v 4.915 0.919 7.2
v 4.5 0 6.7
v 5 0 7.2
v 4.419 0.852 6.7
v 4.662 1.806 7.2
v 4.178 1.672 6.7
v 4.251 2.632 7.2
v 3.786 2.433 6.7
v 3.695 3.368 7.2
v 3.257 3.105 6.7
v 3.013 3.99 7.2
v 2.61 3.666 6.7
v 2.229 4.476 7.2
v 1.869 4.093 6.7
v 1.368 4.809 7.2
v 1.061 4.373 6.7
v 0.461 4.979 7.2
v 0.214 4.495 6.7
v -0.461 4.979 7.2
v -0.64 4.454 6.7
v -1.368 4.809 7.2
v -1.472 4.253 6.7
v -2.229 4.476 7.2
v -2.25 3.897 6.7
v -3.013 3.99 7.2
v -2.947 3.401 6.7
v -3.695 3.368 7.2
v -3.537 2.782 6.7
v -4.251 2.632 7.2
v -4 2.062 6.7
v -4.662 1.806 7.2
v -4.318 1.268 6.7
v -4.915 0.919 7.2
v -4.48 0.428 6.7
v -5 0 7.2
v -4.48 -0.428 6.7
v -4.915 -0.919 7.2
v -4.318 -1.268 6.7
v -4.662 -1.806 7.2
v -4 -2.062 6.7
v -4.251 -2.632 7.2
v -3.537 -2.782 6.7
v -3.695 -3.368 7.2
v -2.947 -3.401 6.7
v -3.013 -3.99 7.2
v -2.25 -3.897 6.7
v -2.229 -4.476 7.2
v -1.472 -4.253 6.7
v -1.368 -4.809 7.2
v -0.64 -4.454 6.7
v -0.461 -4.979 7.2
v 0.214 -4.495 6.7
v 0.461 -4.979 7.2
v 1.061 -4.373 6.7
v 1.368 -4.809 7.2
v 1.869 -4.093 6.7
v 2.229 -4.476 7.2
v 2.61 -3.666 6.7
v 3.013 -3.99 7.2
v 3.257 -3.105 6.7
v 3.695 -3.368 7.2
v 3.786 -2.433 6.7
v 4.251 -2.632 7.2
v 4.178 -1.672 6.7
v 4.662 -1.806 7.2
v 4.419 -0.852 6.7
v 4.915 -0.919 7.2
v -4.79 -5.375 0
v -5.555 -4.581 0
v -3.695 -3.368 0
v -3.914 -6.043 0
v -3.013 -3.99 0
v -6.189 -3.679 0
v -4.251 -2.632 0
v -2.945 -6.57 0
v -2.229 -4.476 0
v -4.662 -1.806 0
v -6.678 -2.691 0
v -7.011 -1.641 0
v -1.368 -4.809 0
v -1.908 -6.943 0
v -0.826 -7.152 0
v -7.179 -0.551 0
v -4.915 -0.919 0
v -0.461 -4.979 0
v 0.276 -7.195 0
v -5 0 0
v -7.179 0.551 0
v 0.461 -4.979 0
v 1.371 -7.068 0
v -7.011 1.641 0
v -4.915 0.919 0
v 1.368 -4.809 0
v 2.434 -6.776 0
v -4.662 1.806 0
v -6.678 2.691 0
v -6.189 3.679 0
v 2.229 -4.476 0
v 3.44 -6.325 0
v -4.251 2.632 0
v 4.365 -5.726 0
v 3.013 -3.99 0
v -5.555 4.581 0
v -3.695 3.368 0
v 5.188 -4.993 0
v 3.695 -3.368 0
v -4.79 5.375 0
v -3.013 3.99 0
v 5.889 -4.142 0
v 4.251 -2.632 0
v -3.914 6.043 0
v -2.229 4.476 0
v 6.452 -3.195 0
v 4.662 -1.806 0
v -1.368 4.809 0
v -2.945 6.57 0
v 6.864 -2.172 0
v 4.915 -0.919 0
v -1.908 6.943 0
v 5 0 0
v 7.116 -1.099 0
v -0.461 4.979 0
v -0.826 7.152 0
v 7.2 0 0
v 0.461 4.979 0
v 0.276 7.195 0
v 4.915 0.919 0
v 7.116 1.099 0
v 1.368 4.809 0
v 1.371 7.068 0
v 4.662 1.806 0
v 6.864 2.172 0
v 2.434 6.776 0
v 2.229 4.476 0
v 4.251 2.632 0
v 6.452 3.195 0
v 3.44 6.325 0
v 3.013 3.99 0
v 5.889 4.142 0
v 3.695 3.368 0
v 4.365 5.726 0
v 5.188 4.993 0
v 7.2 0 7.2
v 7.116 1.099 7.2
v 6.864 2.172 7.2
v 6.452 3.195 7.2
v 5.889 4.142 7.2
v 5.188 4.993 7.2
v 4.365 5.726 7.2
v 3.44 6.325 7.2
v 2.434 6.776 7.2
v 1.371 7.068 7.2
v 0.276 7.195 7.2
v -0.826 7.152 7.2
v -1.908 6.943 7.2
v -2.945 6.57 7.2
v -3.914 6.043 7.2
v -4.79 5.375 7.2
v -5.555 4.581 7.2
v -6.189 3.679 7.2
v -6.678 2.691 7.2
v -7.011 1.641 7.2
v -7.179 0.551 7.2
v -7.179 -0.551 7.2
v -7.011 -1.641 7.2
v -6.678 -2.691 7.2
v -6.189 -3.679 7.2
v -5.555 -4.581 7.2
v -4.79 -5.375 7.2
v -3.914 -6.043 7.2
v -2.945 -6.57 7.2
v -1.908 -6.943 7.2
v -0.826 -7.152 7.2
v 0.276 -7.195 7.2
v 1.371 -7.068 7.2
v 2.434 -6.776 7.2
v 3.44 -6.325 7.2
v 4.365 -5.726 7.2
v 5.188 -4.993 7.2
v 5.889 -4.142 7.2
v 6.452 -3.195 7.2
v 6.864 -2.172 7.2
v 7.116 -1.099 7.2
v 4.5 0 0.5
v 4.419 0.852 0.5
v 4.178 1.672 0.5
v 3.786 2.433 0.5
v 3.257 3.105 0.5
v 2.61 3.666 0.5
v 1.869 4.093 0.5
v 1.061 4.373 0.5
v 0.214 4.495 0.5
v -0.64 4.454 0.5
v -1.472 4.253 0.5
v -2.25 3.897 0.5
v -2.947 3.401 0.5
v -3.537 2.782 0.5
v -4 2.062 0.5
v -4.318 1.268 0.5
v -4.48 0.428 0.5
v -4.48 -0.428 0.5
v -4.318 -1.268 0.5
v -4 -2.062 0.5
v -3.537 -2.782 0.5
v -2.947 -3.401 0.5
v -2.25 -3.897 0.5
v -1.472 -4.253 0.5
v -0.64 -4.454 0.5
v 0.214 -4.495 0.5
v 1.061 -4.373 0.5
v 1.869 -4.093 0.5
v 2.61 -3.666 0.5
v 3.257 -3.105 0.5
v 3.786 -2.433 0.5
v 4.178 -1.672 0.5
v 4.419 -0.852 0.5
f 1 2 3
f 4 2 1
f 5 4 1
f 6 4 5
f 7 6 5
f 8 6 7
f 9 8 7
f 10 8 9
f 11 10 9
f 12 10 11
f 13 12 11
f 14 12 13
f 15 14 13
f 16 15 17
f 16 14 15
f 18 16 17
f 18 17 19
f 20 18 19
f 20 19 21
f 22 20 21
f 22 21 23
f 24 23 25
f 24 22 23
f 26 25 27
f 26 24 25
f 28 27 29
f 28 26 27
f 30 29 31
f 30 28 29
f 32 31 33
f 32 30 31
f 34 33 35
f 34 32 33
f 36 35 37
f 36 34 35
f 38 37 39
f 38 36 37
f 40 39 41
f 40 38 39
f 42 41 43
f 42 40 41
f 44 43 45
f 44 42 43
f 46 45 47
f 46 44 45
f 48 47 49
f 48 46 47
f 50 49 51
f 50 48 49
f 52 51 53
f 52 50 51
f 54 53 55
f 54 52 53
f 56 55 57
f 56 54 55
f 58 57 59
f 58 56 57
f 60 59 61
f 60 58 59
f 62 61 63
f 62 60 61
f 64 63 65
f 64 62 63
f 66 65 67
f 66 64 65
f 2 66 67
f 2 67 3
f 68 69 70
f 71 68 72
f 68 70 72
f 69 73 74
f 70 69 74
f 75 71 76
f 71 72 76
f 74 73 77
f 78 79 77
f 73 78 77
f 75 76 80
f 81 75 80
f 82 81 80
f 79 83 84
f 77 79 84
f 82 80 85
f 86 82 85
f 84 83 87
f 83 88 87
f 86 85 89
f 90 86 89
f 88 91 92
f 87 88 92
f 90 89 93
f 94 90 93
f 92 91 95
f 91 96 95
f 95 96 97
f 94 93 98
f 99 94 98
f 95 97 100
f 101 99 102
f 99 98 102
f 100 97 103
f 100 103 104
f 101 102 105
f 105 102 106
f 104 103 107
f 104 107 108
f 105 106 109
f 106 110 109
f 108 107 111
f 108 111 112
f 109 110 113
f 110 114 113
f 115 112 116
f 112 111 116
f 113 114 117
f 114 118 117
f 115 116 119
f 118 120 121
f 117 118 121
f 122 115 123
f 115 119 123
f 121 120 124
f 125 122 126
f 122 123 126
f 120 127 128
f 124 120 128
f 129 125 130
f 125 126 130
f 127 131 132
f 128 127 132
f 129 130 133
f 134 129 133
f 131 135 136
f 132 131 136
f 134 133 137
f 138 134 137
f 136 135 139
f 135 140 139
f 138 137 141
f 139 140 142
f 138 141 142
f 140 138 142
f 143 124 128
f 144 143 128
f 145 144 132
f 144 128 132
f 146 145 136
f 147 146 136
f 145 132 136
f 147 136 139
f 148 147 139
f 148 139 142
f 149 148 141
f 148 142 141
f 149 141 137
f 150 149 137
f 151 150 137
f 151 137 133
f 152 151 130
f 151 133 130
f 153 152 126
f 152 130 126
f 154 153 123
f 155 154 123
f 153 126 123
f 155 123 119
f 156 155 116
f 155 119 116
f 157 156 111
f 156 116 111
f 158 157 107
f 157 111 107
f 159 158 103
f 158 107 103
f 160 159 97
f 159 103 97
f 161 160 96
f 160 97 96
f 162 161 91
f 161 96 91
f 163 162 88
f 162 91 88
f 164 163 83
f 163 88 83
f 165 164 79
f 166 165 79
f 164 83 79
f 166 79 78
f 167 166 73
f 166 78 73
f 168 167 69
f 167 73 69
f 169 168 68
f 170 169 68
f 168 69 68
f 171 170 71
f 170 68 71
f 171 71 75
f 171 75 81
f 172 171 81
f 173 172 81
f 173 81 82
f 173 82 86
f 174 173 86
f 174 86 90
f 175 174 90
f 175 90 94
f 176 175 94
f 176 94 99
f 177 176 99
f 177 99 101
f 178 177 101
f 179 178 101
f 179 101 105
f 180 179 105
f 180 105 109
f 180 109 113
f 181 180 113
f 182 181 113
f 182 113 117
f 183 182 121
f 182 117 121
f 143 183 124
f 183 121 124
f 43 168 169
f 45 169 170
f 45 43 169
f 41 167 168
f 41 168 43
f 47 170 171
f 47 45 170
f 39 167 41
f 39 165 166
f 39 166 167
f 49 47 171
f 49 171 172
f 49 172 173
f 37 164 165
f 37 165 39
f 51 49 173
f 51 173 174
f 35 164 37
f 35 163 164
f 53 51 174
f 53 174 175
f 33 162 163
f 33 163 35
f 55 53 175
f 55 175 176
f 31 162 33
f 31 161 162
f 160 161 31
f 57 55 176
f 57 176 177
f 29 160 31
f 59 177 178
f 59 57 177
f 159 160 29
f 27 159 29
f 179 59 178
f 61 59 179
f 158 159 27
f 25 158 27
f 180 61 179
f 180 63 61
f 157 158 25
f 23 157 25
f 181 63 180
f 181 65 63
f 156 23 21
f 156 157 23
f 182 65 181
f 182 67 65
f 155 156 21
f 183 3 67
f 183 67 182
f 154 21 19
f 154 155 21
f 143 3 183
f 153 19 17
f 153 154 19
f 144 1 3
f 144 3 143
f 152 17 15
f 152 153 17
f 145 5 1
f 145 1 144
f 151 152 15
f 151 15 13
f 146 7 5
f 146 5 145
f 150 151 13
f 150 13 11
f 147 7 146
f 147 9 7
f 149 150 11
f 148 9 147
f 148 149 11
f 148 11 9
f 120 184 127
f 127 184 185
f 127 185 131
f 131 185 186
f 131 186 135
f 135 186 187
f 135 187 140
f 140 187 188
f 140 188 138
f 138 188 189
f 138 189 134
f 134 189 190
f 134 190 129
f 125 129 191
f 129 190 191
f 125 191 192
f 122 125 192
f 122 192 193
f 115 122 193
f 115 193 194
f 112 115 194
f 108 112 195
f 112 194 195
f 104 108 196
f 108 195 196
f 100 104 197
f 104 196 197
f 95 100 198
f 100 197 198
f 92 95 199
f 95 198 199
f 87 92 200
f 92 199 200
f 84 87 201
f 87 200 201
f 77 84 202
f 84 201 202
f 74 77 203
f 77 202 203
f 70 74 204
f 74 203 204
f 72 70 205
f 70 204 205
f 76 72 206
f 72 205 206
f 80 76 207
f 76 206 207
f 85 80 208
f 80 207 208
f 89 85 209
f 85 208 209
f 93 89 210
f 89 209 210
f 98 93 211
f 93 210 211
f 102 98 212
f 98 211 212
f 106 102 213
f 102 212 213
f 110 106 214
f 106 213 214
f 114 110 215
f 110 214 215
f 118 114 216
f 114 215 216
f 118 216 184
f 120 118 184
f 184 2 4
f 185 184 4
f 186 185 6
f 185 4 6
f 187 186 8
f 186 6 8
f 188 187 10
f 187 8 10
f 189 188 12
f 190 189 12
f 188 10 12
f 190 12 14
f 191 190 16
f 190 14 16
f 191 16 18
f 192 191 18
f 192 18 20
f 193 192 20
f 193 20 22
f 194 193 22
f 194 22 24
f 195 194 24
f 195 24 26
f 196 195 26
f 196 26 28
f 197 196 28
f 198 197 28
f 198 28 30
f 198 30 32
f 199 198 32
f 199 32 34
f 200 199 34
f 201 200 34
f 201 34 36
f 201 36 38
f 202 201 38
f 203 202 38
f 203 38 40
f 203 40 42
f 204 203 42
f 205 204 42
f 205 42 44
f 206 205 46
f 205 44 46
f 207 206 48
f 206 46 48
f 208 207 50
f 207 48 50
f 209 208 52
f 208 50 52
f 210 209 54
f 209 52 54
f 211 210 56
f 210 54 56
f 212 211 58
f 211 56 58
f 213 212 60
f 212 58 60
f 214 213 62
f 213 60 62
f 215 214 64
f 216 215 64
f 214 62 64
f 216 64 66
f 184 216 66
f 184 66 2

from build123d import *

# Parameters (mm, degrees)
F0_R     = 7.2
F1_DEPTH = 7.2
F2_R     = 4.5
F3_DEPTH = 7.201
F4_SIZE  = 0.5


with BuildPart() as f1:
    # F0 (on Top) → F1 (new body)
    with BuildSketch(Plane.XY):
        Circle(F0_R)
    extrude(amount=F1_DEPTH)

    # F2 (on face) → F3 (cut, through all)
    with BuildSketch(Plane.XY.offset(7.2)):
        Circle(F2_R)
    extrude(amount=-F3_DEPTH, mode=Mode.SUBTRACT)

    # F4
    f4_edges = [f1.edges().sort_by_distance(p)[0] for p in [
        (-4.5, 0, 7.2),
        (-4.5, 0, 0),
    ]]
    chamfer(f4_edges, length=F4_SIZE)


solid = f1.part
